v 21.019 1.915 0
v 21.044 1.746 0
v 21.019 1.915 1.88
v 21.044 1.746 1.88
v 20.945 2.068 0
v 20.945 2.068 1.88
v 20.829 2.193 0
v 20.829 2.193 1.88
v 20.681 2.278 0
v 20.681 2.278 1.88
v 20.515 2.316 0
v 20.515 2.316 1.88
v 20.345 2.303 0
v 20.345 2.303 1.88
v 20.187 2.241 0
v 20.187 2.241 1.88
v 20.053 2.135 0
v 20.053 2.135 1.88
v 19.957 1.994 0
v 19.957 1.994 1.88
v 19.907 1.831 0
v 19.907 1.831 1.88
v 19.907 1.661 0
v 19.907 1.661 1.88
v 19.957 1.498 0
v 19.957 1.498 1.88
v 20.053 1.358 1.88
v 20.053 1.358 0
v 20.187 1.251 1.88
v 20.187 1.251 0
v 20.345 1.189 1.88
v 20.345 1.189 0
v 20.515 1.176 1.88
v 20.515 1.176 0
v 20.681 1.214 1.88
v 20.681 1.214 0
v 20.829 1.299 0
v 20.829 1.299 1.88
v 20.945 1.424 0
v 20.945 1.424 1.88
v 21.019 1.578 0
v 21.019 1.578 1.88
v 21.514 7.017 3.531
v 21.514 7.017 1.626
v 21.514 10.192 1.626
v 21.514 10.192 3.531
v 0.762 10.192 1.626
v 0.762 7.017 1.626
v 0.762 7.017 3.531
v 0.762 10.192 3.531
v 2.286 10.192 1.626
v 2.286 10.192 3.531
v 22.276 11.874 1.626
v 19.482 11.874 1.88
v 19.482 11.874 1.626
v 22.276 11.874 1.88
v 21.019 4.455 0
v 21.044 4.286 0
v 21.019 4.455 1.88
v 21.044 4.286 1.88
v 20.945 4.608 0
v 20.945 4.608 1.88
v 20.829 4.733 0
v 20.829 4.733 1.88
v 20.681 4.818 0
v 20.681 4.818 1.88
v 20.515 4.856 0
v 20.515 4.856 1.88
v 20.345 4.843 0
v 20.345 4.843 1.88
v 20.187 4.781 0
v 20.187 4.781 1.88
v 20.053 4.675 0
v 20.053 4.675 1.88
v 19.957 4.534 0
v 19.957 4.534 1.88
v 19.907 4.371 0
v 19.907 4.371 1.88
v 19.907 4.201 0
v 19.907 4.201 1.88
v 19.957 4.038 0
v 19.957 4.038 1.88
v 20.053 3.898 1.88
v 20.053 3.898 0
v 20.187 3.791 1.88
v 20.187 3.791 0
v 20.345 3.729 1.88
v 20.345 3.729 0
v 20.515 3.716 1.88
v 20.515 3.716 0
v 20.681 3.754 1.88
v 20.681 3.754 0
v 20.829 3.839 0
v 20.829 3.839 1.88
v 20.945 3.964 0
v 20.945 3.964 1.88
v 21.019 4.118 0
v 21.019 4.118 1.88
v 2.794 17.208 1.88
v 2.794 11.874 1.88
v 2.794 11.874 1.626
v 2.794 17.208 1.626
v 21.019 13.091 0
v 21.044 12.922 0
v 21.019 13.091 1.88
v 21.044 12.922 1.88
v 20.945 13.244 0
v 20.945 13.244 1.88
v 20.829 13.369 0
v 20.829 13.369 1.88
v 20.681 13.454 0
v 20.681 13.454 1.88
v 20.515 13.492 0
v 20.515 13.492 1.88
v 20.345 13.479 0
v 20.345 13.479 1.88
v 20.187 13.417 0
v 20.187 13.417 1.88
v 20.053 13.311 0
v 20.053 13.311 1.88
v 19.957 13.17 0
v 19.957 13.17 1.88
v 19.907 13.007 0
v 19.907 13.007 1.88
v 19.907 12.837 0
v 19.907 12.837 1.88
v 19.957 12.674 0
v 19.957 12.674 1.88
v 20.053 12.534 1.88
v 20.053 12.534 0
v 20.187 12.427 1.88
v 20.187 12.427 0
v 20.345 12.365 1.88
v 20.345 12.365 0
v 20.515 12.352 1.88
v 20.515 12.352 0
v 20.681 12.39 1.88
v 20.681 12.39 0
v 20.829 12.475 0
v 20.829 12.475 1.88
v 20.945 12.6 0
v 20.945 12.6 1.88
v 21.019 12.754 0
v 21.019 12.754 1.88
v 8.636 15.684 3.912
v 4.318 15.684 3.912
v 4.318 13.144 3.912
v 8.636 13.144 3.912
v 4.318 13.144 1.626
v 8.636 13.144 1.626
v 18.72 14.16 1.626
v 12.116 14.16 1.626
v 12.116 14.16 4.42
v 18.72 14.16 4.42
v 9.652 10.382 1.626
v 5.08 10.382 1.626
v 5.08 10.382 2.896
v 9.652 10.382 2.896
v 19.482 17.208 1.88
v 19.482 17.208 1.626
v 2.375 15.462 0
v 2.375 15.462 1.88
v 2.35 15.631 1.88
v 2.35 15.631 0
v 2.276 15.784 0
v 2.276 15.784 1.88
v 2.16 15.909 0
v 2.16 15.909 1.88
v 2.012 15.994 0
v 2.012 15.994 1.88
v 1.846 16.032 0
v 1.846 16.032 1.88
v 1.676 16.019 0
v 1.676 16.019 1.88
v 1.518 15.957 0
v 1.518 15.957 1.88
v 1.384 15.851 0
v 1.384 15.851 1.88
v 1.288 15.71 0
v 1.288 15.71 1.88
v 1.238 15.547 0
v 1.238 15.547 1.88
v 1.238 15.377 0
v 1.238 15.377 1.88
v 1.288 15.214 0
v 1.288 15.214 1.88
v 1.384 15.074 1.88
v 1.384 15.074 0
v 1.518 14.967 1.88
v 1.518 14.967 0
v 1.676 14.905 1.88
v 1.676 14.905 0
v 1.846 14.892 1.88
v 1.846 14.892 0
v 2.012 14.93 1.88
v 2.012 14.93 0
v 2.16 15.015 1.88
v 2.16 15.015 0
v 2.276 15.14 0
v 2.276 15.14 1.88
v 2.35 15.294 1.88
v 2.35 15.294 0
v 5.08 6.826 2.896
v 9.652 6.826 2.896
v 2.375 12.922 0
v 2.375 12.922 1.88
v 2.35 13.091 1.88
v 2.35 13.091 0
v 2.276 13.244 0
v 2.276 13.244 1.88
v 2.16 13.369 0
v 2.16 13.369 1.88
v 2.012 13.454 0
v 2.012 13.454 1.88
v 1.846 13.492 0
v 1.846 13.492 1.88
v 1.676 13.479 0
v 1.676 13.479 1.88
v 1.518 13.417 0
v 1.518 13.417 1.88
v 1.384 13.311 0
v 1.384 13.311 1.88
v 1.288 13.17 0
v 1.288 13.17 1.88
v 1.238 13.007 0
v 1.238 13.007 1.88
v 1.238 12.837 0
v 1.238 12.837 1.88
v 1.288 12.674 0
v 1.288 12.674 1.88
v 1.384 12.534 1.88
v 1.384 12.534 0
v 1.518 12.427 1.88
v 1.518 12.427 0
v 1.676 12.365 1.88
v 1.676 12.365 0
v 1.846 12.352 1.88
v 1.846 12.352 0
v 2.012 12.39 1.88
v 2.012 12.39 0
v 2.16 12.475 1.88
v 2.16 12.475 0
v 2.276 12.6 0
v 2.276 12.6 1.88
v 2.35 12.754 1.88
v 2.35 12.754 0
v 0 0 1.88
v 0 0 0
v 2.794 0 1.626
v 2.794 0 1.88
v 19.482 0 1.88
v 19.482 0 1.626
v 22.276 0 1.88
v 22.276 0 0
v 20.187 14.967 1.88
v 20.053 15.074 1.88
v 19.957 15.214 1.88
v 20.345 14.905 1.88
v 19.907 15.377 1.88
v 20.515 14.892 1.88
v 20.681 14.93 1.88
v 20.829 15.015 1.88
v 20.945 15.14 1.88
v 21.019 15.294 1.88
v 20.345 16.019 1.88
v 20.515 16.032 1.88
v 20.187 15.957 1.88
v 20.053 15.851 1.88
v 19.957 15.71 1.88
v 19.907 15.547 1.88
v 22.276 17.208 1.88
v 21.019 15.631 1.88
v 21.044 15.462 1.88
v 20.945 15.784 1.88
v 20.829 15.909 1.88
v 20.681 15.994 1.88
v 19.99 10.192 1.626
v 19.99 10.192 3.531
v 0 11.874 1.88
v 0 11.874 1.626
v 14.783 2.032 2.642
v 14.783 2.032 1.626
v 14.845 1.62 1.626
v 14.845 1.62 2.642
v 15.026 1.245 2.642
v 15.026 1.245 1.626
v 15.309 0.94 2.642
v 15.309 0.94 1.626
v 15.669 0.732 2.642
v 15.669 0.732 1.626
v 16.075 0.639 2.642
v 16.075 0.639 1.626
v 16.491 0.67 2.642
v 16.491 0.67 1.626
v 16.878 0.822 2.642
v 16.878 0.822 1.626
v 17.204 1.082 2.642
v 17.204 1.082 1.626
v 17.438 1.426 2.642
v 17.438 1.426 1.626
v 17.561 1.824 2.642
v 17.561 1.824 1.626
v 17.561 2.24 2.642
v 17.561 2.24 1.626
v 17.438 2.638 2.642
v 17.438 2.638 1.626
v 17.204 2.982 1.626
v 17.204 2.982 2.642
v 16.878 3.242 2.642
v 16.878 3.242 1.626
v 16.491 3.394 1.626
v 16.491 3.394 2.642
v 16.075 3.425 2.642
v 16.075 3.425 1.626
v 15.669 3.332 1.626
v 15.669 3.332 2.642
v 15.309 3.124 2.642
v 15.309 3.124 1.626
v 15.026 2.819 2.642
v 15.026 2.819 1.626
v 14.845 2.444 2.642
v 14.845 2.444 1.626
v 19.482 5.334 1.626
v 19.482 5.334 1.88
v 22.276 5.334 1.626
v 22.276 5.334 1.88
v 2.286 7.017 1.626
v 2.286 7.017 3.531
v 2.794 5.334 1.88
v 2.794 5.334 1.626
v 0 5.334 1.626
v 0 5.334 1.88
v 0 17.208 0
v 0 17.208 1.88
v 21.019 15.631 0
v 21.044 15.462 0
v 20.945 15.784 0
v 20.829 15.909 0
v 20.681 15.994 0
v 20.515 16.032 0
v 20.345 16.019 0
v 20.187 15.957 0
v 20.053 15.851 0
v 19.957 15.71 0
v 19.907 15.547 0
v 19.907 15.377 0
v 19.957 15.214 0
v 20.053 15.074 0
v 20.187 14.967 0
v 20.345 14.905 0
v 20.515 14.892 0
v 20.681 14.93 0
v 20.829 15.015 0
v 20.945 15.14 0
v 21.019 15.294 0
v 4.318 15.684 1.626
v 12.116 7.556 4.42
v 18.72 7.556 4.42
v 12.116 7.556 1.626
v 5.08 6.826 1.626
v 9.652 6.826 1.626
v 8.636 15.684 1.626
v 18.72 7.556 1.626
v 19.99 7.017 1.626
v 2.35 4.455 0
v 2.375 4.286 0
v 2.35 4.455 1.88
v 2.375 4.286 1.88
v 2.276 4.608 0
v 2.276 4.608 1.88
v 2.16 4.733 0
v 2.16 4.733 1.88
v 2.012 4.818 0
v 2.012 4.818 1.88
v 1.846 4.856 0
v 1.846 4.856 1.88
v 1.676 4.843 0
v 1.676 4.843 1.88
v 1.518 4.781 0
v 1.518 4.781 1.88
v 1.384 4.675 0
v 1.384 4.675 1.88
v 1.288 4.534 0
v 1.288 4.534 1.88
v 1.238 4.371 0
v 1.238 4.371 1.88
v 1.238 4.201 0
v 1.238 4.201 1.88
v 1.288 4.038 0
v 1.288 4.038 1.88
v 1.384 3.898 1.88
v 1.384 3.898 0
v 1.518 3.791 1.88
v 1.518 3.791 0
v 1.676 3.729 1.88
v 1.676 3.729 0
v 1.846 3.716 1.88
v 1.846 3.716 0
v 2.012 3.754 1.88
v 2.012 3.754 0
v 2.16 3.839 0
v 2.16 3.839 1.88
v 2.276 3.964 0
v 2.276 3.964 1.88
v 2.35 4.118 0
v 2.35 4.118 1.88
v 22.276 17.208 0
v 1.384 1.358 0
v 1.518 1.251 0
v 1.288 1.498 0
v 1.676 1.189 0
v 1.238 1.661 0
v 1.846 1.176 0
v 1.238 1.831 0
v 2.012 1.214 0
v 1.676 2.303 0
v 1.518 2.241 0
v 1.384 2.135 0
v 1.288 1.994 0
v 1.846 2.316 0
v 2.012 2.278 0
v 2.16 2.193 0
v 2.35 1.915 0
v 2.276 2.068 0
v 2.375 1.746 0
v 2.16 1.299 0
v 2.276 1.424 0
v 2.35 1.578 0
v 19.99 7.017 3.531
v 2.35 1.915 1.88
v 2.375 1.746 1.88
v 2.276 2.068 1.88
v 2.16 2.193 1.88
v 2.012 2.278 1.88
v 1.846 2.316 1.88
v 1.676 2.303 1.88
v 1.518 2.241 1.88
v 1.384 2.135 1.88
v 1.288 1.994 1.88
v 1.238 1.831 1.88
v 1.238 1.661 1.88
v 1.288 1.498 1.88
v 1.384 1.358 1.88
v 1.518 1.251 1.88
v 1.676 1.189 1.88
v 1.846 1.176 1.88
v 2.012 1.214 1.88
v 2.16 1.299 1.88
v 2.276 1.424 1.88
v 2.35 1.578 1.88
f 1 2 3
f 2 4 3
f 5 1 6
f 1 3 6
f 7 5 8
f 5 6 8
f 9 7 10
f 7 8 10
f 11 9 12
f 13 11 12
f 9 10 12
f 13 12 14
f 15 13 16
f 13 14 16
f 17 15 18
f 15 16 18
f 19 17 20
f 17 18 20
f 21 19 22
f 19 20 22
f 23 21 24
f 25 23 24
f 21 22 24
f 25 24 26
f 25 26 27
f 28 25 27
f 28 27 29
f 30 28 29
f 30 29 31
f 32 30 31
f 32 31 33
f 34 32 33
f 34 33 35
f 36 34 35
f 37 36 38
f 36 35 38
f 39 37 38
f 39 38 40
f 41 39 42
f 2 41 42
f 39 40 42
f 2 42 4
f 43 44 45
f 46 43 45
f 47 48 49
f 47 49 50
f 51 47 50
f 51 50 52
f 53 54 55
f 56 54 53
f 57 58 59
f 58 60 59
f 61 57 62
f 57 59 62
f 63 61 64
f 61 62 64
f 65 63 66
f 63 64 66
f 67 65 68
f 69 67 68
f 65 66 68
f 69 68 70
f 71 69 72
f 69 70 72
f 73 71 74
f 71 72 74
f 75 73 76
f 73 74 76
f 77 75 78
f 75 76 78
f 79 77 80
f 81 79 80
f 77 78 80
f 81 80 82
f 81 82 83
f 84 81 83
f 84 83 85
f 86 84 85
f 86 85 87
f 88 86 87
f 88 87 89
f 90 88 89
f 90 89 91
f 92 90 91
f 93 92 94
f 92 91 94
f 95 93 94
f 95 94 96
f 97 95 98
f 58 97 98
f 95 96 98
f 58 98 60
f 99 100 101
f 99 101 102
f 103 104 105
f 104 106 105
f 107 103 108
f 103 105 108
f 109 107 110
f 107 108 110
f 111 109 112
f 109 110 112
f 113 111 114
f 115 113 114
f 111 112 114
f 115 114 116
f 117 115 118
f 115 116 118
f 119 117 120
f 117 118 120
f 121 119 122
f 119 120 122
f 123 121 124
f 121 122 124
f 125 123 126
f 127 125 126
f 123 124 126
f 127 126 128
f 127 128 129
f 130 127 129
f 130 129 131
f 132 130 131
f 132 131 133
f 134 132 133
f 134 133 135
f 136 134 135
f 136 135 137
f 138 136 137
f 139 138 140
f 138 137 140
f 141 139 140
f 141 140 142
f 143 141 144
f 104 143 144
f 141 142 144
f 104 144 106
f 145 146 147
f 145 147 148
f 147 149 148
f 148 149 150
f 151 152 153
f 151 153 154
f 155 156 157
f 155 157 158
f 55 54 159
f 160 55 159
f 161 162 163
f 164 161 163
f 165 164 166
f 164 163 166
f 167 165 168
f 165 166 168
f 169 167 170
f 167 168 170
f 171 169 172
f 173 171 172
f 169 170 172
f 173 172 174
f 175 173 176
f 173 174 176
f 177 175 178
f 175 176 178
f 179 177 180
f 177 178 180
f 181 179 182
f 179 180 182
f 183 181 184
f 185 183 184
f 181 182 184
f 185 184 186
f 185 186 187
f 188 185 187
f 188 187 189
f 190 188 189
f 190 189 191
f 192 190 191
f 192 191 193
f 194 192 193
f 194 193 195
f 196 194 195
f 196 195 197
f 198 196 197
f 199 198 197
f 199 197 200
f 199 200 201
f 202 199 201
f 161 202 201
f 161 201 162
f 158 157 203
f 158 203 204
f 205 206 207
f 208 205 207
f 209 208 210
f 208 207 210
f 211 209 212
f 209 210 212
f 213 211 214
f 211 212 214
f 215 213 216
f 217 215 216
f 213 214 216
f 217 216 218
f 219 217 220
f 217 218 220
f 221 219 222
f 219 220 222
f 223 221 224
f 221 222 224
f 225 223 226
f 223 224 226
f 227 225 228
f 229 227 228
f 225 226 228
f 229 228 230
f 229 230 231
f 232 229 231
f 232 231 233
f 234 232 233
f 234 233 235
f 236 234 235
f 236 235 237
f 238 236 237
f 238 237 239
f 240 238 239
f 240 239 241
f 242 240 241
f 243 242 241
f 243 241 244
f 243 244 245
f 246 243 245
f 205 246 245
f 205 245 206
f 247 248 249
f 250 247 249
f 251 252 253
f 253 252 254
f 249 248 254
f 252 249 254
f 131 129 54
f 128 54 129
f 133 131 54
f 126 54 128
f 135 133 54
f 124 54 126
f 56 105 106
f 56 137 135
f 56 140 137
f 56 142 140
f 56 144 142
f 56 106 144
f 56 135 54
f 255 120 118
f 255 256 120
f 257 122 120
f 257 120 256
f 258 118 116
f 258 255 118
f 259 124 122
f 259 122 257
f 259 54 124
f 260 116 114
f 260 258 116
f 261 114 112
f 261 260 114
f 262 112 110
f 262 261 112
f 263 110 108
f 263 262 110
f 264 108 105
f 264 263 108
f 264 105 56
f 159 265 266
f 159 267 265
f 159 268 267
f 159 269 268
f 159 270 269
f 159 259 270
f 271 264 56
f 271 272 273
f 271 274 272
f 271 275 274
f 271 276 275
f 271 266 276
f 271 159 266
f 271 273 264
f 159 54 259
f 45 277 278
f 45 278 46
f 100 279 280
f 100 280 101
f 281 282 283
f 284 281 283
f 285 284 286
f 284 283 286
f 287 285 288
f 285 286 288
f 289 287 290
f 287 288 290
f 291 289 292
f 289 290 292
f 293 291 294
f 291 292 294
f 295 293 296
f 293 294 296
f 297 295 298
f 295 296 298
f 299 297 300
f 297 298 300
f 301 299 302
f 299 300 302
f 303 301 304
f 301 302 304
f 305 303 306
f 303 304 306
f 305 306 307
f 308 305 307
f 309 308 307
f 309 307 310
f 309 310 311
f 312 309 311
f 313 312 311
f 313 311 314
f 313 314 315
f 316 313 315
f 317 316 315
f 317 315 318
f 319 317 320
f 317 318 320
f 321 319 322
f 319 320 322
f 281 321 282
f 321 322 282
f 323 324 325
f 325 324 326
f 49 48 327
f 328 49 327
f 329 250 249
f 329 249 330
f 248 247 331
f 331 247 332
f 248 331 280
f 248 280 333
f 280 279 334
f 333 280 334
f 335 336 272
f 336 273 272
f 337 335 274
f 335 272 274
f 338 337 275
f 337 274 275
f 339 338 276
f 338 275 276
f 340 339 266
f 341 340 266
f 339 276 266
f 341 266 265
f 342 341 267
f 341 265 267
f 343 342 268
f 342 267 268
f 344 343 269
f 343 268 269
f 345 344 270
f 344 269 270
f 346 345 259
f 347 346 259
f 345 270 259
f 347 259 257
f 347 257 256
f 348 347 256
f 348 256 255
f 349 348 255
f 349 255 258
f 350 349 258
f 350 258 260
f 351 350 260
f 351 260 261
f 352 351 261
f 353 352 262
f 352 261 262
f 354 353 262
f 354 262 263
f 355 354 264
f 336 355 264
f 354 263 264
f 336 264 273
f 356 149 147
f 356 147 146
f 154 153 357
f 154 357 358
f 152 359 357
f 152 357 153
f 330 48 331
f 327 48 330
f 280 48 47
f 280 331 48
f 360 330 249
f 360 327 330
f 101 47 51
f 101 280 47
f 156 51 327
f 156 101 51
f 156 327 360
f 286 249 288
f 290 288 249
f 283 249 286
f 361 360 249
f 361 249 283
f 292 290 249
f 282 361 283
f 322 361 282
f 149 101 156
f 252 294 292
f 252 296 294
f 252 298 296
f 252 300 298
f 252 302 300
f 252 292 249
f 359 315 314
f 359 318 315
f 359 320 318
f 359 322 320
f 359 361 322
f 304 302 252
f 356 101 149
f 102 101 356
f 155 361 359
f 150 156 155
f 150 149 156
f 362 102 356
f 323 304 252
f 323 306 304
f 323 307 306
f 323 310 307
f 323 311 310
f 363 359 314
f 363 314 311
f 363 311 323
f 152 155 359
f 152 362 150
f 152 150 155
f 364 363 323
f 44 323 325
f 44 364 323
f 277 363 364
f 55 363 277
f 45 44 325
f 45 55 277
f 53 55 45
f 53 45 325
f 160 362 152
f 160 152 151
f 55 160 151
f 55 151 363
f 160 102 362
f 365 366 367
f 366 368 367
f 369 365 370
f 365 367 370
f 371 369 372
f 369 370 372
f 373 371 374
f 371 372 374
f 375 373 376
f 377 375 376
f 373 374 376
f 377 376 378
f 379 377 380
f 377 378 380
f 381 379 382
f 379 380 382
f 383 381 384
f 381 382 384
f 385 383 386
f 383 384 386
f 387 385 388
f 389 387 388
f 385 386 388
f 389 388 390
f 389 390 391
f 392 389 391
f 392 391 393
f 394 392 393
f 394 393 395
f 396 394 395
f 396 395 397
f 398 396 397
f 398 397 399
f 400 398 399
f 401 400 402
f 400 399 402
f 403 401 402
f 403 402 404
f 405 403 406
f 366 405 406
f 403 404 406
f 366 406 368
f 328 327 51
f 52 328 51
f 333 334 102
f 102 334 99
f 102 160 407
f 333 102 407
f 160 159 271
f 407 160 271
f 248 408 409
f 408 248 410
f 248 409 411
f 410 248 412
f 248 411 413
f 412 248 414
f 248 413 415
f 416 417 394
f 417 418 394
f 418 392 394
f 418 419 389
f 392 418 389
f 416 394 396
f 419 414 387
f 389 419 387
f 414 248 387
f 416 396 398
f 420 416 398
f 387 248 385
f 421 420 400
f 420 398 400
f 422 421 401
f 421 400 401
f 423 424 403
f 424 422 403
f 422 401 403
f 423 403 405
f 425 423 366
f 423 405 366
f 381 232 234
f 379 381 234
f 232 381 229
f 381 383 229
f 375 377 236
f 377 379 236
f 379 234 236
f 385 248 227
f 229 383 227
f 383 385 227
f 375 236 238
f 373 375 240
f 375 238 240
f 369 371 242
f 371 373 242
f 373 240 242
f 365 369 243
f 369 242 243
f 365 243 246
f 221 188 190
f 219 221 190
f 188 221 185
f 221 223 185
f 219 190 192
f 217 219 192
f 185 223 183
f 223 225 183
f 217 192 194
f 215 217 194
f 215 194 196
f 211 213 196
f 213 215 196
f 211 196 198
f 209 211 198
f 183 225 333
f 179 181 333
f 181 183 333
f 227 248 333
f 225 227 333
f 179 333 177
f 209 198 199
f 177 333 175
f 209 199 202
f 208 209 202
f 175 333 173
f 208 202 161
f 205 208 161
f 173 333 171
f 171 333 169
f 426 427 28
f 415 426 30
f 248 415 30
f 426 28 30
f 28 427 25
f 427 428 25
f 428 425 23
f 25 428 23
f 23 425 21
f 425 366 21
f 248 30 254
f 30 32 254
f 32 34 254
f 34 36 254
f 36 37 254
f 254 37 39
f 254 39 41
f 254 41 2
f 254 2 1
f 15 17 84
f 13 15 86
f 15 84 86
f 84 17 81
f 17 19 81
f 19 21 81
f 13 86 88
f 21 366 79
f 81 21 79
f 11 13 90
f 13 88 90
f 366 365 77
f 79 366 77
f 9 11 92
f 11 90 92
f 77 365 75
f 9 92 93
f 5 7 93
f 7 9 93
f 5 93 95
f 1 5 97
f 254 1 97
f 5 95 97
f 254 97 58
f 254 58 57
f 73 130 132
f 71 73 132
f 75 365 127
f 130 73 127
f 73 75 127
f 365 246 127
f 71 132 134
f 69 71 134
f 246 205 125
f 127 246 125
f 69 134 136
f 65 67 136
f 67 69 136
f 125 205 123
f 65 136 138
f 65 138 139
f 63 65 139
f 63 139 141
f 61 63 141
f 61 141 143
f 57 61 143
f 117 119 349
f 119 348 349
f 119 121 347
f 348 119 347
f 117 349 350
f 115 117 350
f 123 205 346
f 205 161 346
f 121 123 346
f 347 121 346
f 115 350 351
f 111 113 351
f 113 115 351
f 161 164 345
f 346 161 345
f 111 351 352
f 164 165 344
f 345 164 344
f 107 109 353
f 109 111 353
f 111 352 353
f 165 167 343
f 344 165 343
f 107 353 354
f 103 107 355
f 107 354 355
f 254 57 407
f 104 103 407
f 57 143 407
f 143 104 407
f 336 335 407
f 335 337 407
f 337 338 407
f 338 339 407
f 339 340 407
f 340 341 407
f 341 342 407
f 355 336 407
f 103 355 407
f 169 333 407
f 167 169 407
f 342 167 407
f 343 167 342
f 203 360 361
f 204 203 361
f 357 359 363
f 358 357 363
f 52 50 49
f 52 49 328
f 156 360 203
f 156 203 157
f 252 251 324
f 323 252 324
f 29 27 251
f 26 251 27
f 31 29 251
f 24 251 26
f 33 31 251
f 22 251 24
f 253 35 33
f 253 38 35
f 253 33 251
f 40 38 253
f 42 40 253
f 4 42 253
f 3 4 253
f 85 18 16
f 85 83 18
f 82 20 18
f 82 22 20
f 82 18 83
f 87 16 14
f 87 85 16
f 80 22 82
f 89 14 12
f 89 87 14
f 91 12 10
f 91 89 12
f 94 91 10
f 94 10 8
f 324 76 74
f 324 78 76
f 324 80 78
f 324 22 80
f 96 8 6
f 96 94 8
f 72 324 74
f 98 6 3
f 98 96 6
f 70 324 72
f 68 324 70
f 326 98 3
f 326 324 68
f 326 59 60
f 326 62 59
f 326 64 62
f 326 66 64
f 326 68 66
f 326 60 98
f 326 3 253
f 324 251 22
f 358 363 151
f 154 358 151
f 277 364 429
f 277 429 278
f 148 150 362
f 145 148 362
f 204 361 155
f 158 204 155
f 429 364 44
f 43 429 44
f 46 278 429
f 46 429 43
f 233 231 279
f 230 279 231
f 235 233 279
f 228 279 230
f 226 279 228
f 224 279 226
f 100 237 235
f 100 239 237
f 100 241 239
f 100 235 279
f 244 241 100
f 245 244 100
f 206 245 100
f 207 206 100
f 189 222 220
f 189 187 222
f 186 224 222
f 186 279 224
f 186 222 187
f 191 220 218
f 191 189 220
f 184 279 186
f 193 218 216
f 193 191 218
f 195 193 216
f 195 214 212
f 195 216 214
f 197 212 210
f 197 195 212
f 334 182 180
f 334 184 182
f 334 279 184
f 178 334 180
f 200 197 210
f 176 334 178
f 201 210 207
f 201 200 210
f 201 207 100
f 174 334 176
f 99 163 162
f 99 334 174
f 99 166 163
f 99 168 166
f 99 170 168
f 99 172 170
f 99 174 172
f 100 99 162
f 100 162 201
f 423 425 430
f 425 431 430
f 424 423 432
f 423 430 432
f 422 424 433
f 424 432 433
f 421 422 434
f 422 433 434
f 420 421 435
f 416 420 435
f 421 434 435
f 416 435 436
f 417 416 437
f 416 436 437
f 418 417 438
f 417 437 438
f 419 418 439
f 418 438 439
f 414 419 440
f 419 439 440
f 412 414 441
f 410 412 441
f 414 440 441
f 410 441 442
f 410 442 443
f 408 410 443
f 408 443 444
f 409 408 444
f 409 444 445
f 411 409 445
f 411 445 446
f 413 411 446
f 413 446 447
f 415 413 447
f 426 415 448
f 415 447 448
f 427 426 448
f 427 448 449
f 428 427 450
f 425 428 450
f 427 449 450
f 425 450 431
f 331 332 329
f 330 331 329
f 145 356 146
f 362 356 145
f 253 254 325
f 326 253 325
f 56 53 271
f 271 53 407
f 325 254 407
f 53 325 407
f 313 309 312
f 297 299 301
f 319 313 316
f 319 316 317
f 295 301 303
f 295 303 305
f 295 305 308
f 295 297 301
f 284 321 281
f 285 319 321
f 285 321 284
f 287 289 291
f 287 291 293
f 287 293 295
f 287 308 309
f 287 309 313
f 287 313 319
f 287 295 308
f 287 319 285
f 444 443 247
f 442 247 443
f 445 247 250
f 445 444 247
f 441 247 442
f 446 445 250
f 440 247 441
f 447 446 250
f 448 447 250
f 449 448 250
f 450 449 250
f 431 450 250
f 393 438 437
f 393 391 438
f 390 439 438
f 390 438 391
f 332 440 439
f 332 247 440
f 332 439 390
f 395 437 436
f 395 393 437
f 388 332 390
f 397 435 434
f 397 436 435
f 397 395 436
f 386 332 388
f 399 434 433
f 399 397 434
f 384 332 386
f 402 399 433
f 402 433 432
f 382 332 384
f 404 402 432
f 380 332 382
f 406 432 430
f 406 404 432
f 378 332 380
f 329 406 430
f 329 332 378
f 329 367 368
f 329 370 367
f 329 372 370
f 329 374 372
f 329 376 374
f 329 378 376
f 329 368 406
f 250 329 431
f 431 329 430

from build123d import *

# Parameters (mm, degrees)
SKETCH1_W           = 22.2758
SKETCH1_H           = 17.2085
BOSS_EXTRUDE1_DEPTH = 1.6256
SKETCH2_R           = 0.5715
CUT_EXTRUDE1_DEPTH  = 29.195501649
SKETCH3_W           = 1.524
SKETCH3_H           = 3.175
BOSS_EXTRUDE2_DEPTH = 1.905
SKETCH3_3_W         = 4.318
SKETCH3_3_H         = 2.54
BOSS_EXTRUDE3_DEPTH = 2.286
SKETCH3_4_W         = 4.572
SKETCH3_4_H         = 3.556
BOSS_EXTRUDE4_DEPTH = 1.27
SKETCH3_5_W         = 6.604
SKETCH3_5_H         = 6.604
BOSS_EXTRUDE5_DEPTH = 2.794
SKETCH3_6_R         = 1.397
BOSS_EXTRUDE6_DEPTH = 1.016
BOSS_EXTRUDE7_START = 0.254
SKETCH4_W           = 2.794
SKETCH4_H           = 5.334
SKETCH4_R           = 0.5715
BOSS_EXTRUDE7_DEPTH = 0.254


with BuildPart() as part:
    # Sketch1 → Boss-Extrude1 (new body)
    with BuildSketch(Plane.XY):
        with Locations((11.1379, 8.60425)):
            Rectangle(SKETCH1_W, SKETCH1_H)
    extrude(amount=BOSS_EXTRUDE1_DEPTH)

    # Sketch2 → Cut-Extrude1 (cut, through all)
    with BuildSketch(Plane.XY.offset(1.6256)):
        with Locations((1.8034, 15.46225)):
            Circle(SKETCH2_R)
        with Locations((1.8034, 12.92225)):
            Circle(SKETCH2_R)
        with Locations((20.4724, 15.46225)):
            Circle(SKETCH2_R)
        with Locations((20.4724, 12.92225)):
            Circle(SKETCH2_R)
        with Locations((20.4724, 4.28625)):
            Circle(SKETCH2_R)
        with Locations((20.4724, 1.74625)):
            Circle(SKETCH2_R)
        with Locations((1.8034, 4.28625)):
            Circle(SKETCH2_R)
        with Locations((1.8034, 1.74625)):
            Circle(SKETCH2_R)
    extrude(amount=-CUT_EXTRUDE1_DEPTH, mode=Mode.SUBTRACT)

    # Sketch3 → Boss-Extrude2 (add)
    with BuildSketch(Plane.XY.offset(1.6256)):
        with Locations((1.524, 8.60425)):
            Rectangle(SKETCH3_W, SKETCH3_H)
        with Locations((20.7518, 8.60425)):
            Rectangle(SKETCH3_W, SKETCH3_H)
    extrude(amount=BOSS_EXTRUDE2_DEPTH)

    # Sketch3<3> → Boss-Extrude3 (add)
    with BuildSketch(Plane.XY.offset(1.6256)):
        with Locations((6.477, 14.4145)):
            Rectangle(SKETCH3_3_W, SKETCH3_3_H)
    extrude(amount=BOSS_EXTRUDE3_DEPTH)

    # Sketch3<4> → Boss-Extrude4 (add)
    with BuildSketch(Plane.XY.offset(1.6256)):
        with Locations((7.366, 8.60425)):
            Rectangle(SKETCH3_4_W, SKETCH3_4_H)
    extrude(amount=BOSS_EXTRUDE4_DEPTH)

    # Sketch3<5> → Boss-Extrude5 (add)
    with BuildSketch(Plane.XY.offset(1.6256)):
        with Locations((15.4178, 10.8585)):
            Rectangle(SKETCH3_5_W, SKETCH3_5_H)
    extrude(amount=BOSS_EXTRUDE5_DEPTH)

    # Sketch3<6> → Boss-Extrude6 (add)
    with BuildSketch(Plane.XY.offset(1.6256)):
        with Locations((16.1798, 2.032)):
            Circle(SKETCH3_6_R)
    extrude(amount=BOSS_EXTRUDE6_DEPTH)

    # Sketch4 → Boss-Extrude7 (add)
    # profile 1 of 4: a face of its own
    with BuildSketch(Plane.XY.offset(1.6256).offset(BOSS_EXTRUDE7_START)):
        with Locations((1.397, 14.5415)):
            Rectangle(SKETCH4_W, SKETCH4_H)
        with Locations((1.8034, 12.92225)):
            Circle(SKETCH4_R, mode=Mode.SUBTRACT)
        with Locations((1.8034, 15.46225)):
            Circle(SKETCH4_R, mode=Mode.SUBTRACT)
    # profile 2 of 4: a face of its own
    with BuildSketch(Plane.XY.offset(1.6256).offset(BOSS_EXTRUDE7_START)):
        with Locations((1.397, 2.667)):
            Rectangle(SKETCH4_W, SKETCH4_H)
        with Locations((1.8034, 1.74625)):
            Circle(SKETCH4_R, mode=Mode.SUBTRACT)
        with Locations((1.8034, 4.28625)):
            Circle(SKETCH4_R, mode=Mode.SUBTRACT)
    # profile 3 of 4: a face of its own
    with BuildSketch(Plane.XY.offset(1.6256).offset(BOSS_EXTRUDE7_START)):
        with Locations((20.8788, 2.667)):
            Rectangle(SKETCH4_W, SKETCH4_H)
        with Locations((20.4724, 4.28625)):
            Circle(SKETCH4_R, mode=Mode.SUBTRACT)
        with Locations((20.4724, 1.74625)):
            Circle(SKETCH4_R, mode=Mode.SUBTRACT)
    # profile 4 of 4: a face of its own
    with BuildSketch(Plane.XY.offset(1.6256).offset(BOSS_EXTRUDE7_START)):
        with Locations((20.8788, 14.5415)):
            Rectangle(SKETCH4_W, SKETCH4_H)
        with Locations((20.4724, 15.46225)):
            Circle(SKETCH4_R, mode=Mode.SUBTRACT)
        with Locations((20.4724, 12.92225)):
            Circle(SKETCH4_R, mode=Mode.SUBTRACT)
    extrude(amount=-BOSS_EXTRUDE7_DEPTH)


solid = part.part
